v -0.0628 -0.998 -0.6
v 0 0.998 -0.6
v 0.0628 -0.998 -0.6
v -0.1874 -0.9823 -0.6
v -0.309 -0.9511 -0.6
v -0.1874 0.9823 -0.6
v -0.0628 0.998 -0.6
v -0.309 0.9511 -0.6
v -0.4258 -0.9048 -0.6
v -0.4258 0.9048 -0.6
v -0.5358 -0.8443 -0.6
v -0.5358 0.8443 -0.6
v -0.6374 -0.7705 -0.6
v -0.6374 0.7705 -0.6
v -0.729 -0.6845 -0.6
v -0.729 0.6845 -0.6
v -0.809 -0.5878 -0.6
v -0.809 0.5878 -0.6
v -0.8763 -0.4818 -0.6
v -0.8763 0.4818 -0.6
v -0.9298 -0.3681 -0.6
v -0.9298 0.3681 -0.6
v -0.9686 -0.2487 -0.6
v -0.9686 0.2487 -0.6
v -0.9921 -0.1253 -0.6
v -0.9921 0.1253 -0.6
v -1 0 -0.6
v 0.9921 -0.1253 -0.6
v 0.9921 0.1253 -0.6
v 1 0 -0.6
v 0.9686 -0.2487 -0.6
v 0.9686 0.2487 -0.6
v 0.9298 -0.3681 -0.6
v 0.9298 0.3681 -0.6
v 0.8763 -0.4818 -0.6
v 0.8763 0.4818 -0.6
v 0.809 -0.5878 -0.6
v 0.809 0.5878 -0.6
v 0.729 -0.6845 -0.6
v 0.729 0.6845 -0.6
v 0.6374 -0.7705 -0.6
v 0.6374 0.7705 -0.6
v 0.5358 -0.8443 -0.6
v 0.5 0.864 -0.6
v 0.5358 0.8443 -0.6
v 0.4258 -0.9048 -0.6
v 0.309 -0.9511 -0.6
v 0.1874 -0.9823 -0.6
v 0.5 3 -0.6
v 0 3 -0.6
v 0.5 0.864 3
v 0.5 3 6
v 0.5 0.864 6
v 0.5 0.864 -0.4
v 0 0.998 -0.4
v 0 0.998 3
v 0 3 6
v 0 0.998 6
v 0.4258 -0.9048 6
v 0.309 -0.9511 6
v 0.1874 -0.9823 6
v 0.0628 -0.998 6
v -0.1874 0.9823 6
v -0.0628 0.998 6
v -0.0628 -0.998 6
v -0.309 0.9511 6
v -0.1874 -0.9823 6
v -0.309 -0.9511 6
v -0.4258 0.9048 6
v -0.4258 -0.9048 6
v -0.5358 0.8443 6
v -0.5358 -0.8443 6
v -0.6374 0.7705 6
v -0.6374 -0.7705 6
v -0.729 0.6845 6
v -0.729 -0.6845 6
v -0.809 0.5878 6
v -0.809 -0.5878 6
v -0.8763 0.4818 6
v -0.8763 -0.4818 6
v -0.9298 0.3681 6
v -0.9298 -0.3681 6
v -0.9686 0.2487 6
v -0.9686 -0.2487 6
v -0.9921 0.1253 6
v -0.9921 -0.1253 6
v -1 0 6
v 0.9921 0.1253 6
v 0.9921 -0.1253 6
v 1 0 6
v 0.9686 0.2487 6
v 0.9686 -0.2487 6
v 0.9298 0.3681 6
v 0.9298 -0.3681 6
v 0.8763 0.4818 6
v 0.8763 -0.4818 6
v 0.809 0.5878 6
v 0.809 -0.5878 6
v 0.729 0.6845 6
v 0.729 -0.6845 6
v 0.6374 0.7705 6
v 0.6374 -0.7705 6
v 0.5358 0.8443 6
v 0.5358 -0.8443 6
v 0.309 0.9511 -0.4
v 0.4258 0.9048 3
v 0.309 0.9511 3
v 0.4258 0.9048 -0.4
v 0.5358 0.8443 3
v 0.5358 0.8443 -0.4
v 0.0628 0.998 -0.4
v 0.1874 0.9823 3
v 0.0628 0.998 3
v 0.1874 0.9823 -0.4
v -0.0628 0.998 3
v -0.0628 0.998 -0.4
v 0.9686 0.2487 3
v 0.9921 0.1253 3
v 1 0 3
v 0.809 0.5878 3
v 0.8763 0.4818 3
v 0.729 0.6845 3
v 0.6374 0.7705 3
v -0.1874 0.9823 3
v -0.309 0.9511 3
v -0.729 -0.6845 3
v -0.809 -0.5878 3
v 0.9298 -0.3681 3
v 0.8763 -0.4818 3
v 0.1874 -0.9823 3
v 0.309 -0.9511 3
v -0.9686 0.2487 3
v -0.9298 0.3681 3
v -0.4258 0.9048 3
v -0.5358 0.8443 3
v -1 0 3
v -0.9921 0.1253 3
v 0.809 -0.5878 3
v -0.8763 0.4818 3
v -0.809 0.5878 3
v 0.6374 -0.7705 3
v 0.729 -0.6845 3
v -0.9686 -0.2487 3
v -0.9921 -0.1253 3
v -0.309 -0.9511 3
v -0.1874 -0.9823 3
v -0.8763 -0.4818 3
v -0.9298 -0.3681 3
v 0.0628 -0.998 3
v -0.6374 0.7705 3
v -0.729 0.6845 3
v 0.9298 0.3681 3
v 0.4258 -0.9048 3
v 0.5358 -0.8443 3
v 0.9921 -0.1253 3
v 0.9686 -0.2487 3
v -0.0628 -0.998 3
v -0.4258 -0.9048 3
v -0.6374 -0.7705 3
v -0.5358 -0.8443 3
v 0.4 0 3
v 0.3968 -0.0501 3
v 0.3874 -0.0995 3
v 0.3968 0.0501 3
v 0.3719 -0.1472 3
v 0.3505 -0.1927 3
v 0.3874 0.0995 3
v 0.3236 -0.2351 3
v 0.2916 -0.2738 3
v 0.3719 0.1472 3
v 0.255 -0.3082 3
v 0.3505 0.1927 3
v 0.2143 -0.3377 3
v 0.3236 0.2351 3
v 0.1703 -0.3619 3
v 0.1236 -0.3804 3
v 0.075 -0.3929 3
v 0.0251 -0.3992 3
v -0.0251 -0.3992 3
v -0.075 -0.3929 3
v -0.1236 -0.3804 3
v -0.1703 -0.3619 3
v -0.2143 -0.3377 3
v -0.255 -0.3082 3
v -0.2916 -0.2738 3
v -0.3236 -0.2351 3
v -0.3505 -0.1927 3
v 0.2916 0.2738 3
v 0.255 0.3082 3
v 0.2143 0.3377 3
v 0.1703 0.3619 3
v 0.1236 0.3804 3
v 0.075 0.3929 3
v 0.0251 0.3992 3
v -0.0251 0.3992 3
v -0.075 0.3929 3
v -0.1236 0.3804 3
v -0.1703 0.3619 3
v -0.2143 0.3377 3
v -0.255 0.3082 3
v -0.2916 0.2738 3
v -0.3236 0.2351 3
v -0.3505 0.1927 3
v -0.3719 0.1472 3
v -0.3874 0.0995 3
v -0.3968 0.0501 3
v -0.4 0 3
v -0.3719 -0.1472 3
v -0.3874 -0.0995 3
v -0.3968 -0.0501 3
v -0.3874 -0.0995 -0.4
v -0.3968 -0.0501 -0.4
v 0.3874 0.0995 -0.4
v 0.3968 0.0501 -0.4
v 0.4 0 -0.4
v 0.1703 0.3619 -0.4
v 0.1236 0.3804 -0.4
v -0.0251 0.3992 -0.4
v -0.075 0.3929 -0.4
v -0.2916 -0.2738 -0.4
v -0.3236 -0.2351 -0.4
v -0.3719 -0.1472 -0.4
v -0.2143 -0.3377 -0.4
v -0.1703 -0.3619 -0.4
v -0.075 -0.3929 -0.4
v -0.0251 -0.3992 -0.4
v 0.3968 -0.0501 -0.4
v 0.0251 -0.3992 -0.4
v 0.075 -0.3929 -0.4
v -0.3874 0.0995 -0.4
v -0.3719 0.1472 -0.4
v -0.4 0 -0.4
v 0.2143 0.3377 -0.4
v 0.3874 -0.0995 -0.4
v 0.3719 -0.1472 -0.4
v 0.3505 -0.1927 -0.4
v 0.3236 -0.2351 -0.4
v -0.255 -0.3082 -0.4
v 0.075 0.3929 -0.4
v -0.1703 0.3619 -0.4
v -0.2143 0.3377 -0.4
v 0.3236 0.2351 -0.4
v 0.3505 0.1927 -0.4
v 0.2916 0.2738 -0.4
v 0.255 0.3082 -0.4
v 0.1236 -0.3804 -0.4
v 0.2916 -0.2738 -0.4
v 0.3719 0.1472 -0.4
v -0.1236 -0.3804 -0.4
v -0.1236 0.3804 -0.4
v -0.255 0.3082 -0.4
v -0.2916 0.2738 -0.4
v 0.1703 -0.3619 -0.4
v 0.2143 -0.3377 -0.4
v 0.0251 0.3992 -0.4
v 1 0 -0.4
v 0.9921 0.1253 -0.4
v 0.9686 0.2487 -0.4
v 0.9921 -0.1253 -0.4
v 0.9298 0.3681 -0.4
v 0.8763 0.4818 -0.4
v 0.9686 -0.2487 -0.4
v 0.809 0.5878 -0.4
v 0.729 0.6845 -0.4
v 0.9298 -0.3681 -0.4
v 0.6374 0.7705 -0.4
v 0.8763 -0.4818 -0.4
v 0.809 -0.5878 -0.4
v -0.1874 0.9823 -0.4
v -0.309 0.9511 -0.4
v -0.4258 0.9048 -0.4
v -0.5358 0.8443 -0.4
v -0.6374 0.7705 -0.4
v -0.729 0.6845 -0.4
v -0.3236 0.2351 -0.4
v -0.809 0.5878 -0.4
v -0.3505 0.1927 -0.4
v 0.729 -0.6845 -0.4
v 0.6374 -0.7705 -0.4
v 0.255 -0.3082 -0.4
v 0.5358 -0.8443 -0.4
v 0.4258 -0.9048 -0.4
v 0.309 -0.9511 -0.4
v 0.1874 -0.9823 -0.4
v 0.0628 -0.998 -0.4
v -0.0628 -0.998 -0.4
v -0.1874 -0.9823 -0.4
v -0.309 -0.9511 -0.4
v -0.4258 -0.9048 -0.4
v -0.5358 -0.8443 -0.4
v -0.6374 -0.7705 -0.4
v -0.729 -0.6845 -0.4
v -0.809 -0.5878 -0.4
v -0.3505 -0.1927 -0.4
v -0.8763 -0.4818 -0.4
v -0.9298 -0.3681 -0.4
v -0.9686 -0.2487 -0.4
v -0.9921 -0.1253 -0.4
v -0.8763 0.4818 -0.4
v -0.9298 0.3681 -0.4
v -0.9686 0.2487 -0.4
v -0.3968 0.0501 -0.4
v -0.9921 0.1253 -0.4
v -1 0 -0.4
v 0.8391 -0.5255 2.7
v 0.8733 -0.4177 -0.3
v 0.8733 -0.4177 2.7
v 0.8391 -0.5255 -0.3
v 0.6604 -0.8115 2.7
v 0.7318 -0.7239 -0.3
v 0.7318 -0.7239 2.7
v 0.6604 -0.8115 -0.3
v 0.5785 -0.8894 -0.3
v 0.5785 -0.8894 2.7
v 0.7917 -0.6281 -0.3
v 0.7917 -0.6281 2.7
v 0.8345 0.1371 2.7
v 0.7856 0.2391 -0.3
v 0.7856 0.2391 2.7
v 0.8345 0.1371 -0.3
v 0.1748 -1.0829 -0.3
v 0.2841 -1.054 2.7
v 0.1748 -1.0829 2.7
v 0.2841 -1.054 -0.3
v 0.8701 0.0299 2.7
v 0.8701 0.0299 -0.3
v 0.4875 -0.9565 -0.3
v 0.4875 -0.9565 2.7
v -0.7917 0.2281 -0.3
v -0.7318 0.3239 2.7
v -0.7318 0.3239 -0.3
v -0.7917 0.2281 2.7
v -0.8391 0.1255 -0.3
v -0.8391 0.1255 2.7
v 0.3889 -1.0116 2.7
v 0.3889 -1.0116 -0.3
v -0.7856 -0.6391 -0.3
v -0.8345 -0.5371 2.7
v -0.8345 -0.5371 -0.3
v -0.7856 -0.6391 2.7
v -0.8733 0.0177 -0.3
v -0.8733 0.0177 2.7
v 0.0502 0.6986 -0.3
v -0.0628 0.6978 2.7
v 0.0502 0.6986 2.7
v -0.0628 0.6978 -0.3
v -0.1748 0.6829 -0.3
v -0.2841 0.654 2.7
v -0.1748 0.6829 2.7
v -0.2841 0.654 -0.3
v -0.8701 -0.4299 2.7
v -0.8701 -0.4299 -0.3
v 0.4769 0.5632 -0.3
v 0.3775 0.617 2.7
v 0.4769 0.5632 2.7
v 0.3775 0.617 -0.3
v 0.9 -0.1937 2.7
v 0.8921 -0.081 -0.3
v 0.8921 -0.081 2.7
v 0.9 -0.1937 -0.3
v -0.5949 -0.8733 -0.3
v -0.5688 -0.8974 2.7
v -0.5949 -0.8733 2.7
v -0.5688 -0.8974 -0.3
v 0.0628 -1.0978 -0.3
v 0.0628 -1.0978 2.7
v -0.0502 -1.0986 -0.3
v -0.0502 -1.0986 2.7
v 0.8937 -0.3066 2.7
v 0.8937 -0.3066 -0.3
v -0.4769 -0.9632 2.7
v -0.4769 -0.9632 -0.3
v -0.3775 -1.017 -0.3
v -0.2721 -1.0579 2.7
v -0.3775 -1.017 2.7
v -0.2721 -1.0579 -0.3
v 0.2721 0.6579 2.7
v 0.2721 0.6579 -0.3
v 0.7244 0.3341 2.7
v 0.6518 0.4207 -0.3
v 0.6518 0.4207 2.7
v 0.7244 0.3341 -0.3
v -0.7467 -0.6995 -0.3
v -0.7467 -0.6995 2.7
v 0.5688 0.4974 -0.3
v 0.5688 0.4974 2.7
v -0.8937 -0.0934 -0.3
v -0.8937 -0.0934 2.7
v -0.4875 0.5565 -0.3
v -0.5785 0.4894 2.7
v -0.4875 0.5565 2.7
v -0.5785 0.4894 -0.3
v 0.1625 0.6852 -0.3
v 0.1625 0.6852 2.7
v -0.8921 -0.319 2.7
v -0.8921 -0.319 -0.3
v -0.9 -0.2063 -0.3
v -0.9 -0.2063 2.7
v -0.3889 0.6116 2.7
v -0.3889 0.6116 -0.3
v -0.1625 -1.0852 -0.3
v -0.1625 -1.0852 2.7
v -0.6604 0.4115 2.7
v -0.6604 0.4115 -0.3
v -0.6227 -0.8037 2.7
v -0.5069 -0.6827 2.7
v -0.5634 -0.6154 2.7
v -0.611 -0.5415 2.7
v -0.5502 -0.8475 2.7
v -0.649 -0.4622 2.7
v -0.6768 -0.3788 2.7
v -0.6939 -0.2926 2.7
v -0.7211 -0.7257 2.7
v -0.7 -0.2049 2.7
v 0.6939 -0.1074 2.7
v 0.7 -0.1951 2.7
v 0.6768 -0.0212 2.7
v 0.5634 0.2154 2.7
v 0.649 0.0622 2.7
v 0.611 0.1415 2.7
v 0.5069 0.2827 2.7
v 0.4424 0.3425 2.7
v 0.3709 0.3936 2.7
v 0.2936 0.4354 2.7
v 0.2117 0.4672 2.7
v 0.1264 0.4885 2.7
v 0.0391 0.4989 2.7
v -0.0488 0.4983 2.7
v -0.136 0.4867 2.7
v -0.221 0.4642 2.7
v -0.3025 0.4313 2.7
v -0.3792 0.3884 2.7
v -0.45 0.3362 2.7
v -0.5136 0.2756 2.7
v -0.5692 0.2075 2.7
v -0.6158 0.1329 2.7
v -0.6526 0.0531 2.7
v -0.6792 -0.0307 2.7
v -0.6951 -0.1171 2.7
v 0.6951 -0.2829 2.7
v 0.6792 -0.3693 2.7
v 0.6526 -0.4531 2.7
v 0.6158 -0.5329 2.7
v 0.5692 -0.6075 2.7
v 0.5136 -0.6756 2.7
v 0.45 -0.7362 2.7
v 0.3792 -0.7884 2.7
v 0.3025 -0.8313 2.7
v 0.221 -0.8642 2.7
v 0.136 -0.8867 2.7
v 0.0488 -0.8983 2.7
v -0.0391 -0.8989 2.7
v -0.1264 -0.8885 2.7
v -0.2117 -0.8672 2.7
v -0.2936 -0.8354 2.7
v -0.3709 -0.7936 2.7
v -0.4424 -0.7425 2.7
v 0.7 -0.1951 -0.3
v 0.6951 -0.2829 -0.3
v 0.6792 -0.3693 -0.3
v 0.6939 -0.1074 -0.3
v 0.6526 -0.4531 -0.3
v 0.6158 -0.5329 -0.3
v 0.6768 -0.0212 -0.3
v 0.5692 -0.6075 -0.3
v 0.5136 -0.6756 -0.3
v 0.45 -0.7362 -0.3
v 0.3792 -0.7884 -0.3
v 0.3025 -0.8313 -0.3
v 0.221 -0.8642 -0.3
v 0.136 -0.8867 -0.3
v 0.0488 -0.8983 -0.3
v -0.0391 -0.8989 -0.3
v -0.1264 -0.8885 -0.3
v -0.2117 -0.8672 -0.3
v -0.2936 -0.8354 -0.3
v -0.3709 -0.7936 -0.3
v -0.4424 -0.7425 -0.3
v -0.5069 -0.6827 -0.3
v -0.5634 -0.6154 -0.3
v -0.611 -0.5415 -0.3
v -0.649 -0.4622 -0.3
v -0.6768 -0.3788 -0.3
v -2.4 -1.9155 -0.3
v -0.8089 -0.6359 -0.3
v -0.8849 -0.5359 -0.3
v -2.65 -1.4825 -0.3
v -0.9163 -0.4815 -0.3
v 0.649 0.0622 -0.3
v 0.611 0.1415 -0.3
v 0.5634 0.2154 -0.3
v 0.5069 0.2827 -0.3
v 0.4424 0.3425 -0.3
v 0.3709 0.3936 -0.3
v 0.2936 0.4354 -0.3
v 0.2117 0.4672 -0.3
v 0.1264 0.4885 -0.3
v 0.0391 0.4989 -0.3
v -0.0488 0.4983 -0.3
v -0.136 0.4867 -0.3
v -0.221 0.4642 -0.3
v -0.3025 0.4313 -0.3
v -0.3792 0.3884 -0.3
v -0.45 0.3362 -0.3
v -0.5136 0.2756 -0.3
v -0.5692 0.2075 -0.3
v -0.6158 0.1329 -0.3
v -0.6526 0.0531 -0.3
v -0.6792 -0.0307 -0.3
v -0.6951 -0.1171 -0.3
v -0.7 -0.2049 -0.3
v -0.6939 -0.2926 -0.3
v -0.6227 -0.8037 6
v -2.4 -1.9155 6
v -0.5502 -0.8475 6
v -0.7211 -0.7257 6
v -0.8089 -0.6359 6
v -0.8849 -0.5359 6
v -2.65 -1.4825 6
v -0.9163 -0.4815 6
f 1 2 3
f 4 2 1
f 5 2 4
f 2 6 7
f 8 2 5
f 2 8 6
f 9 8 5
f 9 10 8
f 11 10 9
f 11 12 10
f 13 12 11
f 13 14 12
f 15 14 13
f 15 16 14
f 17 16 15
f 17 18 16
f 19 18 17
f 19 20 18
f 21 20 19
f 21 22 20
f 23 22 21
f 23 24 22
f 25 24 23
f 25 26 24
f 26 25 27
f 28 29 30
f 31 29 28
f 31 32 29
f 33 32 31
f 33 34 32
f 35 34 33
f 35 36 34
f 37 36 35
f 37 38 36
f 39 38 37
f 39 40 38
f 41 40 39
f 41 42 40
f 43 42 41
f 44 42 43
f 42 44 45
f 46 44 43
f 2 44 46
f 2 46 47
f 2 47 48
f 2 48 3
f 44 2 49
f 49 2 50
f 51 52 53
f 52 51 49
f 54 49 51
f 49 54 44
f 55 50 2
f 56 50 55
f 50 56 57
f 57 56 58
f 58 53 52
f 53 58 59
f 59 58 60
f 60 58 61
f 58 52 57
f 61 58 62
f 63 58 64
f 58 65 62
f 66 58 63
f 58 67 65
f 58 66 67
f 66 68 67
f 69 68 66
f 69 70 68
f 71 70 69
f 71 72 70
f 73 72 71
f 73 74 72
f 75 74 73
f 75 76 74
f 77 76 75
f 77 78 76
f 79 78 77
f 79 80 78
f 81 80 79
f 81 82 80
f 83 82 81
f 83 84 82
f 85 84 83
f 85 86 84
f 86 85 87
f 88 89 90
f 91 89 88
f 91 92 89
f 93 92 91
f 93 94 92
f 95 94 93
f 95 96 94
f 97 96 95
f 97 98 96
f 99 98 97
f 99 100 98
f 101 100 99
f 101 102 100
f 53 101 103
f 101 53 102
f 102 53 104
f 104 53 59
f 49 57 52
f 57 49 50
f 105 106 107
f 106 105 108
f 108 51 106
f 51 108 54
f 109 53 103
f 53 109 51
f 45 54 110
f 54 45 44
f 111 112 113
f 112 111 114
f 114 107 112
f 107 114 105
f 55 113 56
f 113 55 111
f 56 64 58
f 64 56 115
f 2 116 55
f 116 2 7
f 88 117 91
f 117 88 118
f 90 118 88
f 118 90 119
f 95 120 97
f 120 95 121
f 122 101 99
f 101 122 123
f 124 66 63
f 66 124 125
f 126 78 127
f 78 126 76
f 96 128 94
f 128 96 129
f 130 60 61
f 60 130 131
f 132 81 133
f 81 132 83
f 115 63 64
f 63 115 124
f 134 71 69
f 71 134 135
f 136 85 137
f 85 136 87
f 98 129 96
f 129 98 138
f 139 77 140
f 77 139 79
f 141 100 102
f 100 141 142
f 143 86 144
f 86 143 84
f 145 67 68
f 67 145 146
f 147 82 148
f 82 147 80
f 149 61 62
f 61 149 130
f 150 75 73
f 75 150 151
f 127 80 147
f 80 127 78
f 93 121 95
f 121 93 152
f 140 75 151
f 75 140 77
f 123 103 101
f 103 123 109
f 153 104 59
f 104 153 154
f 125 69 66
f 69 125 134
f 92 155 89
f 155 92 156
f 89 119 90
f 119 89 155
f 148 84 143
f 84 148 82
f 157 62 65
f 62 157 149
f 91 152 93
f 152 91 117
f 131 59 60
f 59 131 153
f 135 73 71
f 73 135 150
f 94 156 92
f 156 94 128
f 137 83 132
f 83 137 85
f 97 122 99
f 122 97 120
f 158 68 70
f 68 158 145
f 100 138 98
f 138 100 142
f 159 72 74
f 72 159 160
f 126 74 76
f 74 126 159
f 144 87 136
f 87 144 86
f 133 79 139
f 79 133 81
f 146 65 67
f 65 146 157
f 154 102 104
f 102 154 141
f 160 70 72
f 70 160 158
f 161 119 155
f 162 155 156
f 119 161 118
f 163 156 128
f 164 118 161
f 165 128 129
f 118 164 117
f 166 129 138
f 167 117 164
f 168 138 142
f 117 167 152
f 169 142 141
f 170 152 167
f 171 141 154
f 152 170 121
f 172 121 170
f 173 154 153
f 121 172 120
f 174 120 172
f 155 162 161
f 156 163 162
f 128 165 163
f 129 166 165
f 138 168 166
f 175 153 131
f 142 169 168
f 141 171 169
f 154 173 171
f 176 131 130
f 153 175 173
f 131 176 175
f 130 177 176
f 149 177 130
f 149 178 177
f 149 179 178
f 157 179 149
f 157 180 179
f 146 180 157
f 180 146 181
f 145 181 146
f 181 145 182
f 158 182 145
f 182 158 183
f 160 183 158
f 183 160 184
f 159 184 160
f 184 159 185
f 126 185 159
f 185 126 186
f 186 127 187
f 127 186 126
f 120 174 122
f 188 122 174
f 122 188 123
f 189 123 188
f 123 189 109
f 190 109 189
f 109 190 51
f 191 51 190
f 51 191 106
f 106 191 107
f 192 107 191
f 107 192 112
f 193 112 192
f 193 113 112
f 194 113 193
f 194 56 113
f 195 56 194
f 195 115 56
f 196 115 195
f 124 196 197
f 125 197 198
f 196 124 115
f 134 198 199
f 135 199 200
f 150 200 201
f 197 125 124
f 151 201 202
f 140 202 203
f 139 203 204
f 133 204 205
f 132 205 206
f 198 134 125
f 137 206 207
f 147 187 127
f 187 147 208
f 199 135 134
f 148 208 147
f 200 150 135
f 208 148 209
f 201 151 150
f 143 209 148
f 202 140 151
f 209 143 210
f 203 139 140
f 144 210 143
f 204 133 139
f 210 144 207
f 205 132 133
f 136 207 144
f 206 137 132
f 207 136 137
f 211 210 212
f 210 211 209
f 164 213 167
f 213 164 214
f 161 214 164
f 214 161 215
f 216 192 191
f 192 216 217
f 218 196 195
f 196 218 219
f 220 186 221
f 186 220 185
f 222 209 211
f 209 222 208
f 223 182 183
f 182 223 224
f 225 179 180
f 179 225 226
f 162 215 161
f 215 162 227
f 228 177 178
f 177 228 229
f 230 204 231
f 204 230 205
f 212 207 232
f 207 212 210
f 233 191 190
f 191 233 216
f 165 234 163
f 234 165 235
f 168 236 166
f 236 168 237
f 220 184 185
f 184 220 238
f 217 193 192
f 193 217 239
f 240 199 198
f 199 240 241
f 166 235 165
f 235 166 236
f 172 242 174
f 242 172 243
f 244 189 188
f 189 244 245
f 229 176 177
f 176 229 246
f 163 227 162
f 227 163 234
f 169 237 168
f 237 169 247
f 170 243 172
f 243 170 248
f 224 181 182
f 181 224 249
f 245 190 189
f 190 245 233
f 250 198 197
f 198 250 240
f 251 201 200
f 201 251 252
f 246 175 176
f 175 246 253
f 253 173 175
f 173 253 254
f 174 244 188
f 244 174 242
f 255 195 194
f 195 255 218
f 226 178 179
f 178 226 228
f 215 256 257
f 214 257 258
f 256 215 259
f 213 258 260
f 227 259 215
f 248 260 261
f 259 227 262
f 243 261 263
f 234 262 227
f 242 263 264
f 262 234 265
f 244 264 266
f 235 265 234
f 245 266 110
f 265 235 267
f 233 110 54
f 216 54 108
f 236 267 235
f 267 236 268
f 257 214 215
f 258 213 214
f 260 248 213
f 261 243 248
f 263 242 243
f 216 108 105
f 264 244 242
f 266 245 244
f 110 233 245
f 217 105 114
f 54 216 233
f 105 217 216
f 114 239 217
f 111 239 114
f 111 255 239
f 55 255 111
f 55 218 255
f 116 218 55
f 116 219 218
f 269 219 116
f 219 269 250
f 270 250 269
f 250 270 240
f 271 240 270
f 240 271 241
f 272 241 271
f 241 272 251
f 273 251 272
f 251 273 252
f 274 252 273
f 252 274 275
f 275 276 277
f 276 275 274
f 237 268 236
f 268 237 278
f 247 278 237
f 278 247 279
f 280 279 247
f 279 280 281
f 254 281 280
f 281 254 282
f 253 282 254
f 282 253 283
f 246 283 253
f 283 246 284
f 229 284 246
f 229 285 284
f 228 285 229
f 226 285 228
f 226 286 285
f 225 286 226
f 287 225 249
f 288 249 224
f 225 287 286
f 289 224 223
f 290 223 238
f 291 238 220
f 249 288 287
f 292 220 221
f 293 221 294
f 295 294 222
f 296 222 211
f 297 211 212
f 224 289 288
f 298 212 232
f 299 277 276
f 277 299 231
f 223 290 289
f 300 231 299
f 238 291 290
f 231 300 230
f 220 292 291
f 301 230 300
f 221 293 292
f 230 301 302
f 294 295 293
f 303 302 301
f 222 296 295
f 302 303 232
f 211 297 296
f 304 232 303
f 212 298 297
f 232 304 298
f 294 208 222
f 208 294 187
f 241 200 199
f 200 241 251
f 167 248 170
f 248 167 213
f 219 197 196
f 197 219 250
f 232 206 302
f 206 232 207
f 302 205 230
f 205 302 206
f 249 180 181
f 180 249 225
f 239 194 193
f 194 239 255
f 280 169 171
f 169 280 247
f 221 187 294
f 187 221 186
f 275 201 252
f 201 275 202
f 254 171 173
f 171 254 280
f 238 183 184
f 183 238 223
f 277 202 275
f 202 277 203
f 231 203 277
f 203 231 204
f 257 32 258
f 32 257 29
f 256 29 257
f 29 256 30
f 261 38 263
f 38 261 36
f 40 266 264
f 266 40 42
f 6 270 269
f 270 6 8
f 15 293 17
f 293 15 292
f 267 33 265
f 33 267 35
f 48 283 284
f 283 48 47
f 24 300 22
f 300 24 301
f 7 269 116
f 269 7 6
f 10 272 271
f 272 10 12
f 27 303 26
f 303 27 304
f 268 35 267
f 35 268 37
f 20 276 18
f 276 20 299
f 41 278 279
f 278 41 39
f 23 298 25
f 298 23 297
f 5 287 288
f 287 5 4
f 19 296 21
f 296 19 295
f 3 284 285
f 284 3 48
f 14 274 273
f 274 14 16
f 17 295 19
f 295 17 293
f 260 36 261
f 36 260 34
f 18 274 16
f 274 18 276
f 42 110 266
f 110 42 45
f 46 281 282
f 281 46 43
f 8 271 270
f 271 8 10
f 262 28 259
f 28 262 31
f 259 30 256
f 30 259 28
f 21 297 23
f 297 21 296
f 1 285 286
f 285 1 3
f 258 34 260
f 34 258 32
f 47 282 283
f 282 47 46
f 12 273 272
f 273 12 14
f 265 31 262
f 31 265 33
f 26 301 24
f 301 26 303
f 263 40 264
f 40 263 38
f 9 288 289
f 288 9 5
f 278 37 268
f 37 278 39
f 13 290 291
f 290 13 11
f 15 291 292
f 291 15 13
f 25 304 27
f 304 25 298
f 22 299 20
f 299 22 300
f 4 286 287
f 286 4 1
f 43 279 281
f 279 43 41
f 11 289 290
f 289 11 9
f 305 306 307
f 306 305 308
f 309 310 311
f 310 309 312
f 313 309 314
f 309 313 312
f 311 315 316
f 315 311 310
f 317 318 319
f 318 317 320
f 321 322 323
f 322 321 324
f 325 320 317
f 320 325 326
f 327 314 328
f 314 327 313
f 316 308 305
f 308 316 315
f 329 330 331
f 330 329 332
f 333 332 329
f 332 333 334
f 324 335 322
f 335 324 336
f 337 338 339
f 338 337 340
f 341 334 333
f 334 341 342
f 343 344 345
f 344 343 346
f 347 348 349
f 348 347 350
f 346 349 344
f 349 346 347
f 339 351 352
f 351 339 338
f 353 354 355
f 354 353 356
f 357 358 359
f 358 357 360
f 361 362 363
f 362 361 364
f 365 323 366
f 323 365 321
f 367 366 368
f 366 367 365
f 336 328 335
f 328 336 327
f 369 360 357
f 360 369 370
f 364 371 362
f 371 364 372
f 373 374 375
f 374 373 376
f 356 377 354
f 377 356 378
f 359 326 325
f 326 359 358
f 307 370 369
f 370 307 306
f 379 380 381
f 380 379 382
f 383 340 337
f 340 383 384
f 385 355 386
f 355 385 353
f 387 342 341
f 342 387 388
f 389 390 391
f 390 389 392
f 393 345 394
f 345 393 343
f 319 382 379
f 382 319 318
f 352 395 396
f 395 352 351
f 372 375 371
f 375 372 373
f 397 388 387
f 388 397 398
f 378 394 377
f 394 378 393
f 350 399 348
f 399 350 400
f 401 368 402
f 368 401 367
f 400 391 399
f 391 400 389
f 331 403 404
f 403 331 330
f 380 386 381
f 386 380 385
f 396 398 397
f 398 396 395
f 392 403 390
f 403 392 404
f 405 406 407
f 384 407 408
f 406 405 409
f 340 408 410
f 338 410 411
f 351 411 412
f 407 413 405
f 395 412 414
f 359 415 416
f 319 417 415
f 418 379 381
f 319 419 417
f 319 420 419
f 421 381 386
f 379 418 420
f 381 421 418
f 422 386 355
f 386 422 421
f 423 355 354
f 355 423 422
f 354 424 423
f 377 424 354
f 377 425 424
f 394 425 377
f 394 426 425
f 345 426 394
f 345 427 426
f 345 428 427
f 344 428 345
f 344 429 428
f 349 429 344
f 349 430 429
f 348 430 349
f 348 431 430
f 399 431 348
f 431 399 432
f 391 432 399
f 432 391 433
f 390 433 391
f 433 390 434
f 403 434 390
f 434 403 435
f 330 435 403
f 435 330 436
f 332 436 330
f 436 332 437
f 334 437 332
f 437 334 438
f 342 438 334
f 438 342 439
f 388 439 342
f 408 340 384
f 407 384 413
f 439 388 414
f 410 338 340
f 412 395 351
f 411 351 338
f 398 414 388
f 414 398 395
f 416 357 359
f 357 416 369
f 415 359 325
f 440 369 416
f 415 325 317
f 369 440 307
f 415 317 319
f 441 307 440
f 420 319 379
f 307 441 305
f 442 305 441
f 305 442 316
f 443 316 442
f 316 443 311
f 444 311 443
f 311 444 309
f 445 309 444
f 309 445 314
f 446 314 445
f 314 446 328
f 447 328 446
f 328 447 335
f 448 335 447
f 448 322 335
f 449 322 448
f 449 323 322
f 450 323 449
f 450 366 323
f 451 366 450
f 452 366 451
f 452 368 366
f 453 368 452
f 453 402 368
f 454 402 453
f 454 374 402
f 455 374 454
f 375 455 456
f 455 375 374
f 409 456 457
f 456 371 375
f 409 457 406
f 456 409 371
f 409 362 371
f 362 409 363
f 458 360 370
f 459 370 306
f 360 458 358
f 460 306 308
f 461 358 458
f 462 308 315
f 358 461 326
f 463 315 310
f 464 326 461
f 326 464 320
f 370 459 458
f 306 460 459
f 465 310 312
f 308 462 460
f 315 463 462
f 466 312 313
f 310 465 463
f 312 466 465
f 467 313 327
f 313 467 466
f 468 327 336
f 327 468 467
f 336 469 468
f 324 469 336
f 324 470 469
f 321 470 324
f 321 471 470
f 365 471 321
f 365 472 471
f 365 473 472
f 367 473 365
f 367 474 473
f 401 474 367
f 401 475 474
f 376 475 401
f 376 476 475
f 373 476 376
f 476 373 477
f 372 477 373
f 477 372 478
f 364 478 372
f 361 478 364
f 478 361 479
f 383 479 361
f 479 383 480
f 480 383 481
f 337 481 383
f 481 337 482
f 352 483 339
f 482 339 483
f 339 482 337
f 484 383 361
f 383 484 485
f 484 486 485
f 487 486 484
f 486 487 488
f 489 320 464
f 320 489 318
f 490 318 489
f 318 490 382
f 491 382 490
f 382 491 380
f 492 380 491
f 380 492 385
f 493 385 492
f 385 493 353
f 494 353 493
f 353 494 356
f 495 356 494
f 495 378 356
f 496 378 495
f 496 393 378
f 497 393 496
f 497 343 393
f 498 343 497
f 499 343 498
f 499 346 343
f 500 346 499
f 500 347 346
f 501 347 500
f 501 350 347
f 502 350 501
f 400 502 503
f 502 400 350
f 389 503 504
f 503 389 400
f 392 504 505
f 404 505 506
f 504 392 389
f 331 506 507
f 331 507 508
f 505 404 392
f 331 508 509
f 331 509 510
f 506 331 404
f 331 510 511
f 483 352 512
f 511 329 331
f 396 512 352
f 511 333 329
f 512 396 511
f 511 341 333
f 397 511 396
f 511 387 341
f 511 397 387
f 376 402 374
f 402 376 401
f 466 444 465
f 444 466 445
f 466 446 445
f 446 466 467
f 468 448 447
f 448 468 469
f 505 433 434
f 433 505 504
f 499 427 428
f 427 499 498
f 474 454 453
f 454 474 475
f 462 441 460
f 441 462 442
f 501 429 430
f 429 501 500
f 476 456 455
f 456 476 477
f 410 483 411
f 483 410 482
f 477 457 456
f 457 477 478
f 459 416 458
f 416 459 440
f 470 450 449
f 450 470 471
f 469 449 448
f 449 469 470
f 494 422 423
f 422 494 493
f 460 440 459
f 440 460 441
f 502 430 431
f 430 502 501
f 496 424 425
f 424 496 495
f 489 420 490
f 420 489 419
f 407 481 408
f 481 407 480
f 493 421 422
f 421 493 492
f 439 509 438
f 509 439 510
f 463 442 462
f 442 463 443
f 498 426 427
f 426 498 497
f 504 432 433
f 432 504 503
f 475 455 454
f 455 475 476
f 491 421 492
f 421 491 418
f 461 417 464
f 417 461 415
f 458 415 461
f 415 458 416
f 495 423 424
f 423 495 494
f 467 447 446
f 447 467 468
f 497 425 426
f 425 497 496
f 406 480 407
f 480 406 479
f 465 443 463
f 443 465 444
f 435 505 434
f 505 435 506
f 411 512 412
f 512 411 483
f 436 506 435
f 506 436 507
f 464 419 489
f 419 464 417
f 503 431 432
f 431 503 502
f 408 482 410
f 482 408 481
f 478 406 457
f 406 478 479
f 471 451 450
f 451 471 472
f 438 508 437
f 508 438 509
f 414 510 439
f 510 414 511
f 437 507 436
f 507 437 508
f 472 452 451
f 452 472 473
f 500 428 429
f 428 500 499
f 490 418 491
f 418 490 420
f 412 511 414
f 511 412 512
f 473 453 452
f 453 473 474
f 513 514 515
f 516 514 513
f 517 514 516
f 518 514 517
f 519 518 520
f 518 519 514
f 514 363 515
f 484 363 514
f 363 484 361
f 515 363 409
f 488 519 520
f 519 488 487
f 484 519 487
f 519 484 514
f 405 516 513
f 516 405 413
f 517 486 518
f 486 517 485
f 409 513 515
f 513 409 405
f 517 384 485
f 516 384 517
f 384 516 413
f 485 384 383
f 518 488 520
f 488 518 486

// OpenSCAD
module block_long() { //long block
 	difference(){
 		cube([6.6, 3, 0.5]);
 		
 		translate([-1,0,0])
 			rotate([0,270,180])
 			cylinder(h=8, r=1, $fn=50);
 	}
 }
 
 module block_short() { //short block
 	difference(){
 		cube([6.3, 3, 0.5]);
 		
 		translate([-0.5,0,0])
 			rotate([0,270,180])
 			cylinder(h=8, r=1, $fn=50);
 	}
 }
 
 module cylinder_bottom(){
 	difference(){
 		cylinder(h=3, r=0.9, $fn=50);
 
 		translate([0,0,-1])
 			cylinder(h=8, r=0.7, $fn=50);
 	}
 
 	translate([-.2, .1, 0])
 	rotate([0,270, 170])
 		block_short();
 }
 
 module cylinder_top(){
 
 	translate([0,0,3])
 		cylinder(h=3, r=1, $fn=50);
 	translate([0,0,-.4]) //innder dowel
 		cylinder(h=6.4, r=.4, $fn=50);
 
 	translate([0, 0, 6])
 		rotate([0,90,0])
 			block_long();
 	translate([0,0,-.6])
 
 	cylinder(h=.2, r=1, $fn=50);
 }
 
 //intersection(){
 	color("blue")
 		cylinder_top();
 
 	translate([0,-.2,-0.3])
 		rotate([0,0, -50])
 		cylinder_bottom();
 //}
 
